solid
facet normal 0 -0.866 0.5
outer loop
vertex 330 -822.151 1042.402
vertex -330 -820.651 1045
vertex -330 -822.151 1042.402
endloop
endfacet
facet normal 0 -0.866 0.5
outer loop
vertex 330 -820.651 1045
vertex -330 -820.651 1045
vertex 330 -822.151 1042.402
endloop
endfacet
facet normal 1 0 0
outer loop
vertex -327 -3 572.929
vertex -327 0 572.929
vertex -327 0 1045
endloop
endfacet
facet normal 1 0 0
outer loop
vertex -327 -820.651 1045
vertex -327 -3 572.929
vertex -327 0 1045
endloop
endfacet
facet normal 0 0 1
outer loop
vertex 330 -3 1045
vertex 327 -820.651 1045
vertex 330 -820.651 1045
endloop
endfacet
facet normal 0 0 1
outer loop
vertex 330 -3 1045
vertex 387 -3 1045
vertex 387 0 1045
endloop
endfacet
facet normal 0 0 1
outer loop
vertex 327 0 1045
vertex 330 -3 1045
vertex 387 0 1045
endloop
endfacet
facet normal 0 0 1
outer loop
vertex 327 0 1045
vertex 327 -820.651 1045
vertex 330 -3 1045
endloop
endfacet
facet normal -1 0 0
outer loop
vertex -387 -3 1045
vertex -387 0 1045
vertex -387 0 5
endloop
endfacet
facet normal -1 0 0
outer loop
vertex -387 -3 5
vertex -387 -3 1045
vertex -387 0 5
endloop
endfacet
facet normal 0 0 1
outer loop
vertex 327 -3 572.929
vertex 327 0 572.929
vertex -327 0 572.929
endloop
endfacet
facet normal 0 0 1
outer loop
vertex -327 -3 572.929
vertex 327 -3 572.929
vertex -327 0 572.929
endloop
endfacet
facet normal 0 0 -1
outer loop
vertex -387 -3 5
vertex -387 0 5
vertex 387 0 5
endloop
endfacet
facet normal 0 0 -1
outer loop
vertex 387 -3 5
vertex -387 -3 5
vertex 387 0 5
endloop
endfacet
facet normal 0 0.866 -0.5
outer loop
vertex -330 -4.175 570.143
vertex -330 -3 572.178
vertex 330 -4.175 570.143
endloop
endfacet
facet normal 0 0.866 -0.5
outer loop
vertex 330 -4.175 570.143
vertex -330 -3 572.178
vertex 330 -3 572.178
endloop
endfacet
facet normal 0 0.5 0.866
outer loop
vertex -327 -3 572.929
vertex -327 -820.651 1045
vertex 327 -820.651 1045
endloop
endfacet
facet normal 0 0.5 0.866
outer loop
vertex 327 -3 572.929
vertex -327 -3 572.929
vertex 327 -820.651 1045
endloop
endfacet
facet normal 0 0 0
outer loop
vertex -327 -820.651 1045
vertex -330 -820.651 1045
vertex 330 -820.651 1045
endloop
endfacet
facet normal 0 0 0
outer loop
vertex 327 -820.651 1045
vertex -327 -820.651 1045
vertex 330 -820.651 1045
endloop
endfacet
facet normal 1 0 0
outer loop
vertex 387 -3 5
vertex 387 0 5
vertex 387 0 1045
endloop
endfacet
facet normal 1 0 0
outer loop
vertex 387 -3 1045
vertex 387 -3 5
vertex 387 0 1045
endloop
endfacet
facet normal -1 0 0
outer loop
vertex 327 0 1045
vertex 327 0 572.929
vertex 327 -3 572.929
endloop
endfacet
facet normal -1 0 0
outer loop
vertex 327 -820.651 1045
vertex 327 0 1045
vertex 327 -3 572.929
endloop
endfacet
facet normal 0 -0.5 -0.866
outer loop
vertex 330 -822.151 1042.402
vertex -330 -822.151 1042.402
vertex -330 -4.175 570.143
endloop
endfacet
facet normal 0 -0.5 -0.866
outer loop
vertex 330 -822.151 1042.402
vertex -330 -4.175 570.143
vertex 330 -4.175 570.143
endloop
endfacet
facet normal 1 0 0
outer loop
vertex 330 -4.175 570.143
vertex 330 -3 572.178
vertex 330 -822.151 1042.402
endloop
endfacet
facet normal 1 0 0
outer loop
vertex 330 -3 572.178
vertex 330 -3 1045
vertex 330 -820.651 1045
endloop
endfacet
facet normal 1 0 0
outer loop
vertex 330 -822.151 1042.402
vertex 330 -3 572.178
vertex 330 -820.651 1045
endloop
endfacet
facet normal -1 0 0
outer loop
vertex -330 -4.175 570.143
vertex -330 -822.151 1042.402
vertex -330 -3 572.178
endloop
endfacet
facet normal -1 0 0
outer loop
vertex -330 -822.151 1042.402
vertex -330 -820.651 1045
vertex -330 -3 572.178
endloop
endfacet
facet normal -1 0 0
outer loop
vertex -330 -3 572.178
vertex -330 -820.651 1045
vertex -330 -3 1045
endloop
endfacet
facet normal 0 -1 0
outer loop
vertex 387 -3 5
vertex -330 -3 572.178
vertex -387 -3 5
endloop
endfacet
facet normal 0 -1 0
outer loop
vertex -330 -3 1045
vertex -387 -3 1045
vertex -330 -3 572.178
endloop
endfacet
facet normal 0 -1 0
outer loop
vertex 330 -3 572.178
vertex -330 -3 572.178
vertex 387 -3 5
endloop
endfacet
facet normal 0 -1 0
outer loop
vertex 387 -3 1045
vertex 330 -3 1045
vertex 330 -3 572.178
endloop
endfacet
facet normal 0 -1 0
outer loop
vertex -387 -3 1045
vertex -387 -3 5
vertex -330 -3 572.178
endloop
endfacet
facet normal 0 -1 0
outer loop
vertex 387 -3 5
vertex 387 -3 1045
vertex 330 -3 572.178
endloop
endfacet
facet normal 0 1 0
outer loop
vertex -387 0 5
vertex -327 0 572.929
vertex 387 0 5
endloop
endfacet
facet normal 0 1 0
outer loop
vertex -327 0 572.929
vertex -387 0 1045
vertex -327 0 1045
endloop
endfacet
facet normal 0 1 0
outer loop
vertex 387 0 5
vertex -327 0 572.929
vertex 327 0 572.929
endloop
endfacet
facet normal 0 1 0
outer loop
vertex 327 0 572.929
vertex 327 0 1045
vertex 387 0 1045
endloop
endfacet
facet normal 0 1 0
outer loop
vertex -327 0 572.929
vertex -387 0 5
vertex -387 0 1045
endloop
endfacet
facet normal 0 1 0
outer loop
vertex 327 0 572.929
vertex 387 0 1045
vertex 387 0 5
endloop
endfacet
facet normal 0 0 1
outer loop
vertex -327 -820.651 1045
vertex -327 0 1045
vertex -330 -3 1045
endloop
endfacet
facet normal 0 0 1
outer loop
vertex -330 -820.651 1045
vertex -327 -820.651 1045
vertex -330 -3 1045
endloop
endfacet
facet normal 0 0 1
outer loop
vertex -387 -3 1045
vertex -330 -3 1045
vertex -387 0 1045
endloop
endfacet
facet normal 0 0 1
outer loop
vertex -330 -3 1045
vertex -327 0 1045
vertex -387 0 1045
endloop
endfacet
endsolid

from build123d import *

# Parameters (mm, degrees)
F1_DEPTH = 3
F3_DEPTH = 3
F5_DEPTH = 3
F6_W     = 660
F6_H     = 944.517678
F7_DEPTH = 3
F8_DEPTH = 3


with BuildPart() as f1:
    # F0 (on Front) → F1 (new body)
    with BuildSketch(Plane.XZ):
        Polygon((-387, 1045), (-387, 165.699527), (-387, 5), (387, 5), (387, 165.699527), (387, 1045), (327, 1045), (327, 572.928839), (-327, 572.928839), (-327, 1045), align=None)
    extrude(amount=F1_DEPTH)

    # F2 (on face) → F3 (join)
    with BuildSketch(Plane(origin=(327, 0, 0), x_dir=(0, -1, 0), z_dir=(-1, 0, 0))):
        Polygon((820.651236, 1045), (0, 1045), (0, 572.928839), (3, 572.928839), align=None)
        Polygon((820.651236, 1045), (3, 1045), (3, 572.928839), align=None)
    extrude(amount=-F3_DEPTH)

    # F4 (on face) → F5 (join)
    with BuildSketch(Plane.YZ.offset(-327)):
        Polygon((0, 1045), (-3, 1045), (-820.651236, 1045), (-3, 572.928839), (0, 572.928839), align=None)
    extrude(amount=-F5_DEPTH)

    # F6 (on face) → F7 (join)
    with BuildSketch(Plane(origin=(0, 247.335464, 428.397591), x_dir=(1, 0, 0), z_dir=(0, -0.5, -0.866025))):
        with Locations((0, 760.945979)):
            Rectangle(F6_W, F6_H)
    extrude(amount=F7_DEPTH)

    # F6 (on face) → F8 (join)
    with BuildSketch(Plane(origin=(0, 247.335464, 428.397591), x_dir=(1, 0, 0), z_dir=(0, -0.5, -0.866025))):
        with Locations((0, 760.945979)):
            Rectangle(F6_W, F6_H)
    extrude(amount=F8_DEPTH)


solid = f1.part
